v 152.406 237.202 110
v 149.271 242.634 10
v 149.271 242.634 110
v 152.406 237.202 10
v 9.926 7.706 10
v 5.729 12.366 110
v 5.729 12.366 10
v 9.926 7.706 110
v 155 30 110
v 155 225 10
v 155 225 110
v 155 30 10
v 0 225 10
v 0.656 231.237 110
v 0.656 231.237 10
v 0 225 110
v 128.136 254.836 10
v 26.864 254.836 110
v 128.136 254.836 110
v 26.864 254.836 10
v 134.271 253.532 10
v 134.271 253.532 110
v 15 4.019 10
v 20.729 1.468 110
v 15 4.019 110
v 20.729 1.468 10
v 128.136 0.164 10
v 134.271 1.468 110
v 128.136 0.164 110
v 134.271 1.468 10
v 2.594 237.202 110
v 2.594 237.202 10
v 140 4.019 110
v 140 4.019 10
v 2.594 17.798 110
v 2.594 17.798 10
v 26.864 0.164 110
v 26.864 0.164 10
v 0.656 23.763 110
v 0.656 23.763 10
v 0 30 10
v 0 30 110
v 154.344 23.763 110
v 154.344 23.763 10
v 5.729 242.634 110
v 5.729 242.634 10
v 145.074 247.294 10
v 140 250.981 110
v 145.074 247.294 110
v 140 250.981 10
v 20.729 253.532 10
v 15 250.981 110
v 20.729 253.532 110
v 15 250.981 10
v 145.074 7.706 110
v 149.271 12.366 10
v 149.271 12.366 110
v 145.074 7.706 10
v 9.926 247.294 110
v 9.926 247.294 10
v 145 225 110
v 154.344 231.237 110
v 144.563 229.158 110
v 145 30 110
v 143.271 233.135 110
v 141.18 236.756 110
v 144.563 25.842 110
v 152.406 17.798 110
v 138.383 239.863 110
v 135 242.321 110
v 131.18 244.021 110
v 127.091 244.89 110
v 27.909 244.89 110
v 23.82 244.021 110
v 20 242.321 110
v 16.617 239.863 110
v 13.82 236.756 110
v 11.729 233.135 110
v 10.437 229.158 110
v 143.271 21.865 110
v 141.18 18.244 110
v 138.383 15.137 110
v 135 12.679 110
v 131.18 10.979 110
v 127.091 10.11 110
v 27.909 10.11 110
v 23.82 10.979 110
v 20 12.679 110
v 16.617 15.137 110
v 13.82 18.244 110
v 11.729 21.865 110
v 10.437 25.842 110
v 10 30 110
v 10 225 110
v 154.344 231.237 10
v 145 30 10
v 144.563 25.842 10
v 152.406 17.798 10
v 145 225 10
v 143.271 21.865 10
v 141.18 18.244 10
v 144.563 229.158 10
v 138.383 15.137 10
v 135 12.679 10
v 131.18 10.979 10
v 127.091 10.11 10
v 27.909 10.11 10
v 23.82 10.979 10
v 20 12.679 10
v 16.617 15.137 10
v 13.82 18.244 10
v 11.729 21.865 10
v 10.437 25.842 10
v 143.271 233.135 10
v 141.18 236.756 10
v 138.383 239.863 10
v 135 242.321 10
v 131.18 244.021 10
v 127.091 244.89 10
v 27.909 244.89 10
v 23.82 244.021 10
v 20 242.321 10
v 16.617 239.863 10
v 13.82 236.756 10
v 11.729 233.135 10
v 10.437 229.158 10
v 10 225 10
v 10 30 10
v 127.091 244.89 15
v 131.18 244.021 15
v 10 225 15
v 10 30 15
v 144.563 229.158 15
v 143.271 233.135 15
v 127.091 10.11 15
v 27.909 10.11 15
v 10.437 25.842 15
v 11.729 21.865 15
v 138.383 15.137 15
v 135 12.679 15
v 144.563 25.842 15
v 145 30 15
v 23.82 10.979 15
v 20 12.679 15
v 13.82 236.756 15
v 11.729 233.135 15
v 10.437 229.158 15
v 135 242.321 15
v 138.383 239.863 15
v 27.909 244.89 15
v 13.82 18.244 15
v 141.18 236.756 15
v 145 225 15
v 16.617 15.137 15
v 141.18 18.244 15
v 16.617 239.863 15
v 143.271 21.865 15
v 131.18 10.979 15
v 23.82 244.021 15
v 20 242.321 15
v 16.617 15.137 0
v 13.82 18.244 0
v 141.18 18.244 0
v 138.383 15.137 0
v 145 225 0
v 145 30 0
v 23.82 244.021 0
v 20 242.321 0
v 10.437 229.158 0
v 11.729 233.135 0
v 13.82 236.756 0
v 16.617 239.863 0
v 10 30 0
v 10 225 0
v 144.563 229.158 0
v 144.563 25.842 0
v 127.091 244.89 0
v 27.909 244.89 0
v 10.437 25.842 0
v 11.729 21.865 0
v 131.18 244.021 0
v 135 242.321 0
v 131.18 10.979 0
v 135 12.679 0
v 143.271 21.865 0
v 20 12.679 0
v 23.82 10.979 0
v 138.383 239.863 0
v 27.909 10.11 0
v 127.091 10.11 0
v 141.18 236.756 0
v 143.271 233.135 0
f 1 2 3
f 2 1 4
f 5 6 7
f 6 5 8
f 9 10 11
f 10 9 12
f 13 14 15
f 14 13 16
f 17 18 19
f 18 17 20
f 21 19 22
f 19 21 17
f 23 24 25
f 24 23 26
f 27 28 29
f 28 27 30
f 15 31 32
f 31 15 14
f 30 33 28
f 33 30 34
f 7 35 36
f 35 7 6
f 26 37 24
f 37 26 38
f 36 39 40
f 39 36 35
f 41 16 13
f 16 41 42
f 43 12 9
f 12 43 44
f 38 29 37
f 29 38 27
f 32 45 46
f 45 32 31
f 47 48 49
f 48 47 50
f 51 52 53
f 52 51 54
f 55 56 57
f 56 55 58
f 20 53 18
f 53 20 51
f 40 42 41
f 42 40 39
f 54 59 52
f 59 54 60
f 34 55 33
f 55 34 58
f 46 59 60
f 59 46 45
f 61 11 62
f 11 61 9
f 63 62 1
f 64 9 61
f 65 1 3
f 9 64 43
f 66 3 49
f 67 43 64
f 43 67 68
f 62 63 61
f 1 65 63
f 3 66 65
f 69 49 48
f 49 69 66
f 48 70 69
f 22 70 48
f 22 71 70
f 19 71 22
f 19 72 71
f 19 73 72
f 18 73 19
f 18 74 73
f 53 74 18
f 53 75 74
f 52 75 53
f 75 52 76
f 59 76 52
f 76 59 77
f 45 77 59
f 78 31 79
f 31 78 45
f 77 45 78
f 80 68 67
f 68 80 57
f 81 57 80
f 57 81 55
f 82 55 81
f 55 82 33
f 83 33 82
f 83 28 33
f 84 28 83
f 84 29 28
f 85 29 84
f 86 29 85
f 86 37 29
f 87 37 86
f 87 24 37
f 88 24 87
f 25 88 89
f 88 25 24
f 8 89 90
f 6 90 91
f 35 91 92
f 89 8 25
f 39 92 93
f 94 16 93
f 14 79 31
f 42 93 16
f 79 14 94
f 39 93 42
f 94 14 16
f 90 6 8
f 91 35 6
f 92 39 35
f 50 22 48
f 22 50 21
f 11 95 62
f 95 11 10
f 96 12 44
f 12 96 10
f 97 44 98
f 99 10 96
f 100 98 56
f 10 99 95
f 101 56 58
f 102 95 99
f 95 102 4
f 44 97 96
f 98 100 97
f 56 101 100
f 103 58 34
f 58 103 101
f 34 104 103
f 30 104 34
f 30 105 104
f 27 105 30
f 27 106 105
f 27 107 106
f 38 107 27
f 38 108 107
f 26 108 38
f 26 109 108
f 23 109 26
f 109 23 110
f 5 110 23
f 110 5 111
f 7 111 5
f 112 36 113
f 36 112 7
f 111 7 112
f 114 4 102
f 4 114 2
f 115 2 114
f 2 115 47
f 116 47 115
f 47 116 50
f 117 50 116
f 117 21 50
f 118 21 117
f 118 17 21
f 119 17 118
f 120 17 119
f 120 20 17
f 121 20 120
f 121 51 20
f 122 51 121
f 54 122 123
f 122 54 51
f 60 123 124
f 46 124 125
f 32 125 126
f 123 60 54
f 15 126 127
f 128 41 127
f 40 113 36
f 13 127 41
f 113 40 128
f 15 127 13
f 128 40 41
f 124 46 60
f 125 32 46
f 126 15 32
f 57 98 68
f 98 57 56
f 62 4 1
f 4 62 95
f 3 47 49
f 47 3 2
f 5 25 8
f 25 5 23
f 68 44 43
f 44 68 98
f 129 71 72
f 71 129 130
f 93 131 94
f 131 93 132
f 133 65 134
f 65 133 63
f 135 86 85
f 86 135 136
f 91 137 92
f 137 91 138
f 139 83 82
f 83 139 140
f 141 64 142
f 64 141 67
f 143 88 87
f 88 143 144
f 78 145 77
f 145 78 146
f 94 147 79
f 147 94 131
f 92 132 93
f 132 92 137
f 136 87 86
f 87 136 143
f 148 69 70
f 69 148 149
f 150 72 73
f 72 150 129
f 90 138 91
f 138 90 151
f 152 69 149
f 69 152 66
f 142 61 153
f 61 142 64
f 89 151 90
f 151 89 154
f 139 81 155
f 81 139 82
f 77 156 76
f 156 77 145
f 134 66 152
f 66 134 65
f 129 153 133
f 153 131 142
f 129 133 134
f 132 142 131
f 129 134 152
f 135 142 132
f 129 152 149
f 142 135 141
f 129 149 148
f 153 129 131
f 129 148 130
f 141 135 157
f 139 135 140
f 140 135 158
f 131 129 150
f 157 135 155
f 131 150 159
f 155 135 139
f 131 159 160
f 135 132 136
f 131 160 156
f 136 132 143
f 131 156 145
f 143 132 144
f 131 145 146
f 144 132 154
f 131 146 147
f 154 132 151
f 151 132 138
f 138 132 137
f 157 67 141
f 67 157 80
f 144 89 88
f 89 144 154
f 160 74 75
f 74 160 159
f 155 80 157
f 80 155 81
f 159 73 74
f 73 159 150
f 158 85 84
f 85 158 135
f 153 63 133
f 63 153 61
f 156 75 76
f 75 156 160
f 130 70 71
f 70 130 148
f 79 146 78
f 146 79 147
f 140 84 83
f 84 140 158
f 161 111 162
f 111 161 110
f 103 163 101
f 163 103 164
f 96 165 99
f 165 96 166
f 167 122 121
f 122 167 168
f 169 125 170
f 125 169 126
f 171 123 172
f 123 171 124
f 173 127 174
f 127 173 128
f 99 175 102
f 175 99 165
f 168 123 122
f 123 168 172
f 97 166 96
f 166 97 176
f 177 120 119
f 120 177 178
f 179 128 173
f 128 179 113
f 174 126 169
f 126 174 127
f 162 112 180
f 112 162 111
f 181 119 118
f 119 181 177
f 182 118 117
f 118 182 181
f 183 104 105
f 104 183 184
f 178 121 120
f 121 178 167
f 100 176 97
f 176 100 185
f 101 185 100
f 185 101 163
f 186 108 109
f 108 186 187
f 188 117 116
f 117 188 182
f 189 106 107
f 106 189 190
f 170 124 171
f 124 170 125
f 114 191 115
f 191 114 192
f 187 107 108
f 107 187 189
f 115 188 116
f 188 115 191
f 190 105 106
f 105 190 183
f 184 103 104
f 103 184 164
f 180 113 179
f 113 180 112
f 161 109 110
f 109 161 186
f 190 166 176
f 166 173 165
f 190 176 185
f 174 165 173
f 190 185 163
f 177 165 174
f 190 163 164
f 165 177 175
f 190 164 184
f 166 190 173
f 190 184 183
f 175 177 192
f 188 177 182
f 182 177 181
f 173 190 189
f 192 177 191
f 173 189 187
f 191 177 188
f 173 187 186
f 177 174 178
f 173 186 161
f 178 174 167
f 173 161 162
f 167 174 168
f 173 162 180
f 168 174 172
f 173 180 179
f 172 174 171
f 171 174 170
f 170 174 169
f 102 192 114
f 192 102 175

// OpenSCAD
radius=20;
lengthInternal=135;
widthInternal=235;
thickness=10;
outRadius=radius+thickness;
lengthExternal=thickness*2+lengthInternal;
widthExternal=thickness*2+widthInternal;
height=100;

color("red") translate([thickness,thickness,0]) hull() {
	translate([radius,radius,0]) cylinder(r=radius, h=10);
	translate([lengthInternal-radius,radius,0]) cylinder(r=radius, h=10);
	translate([radius,widthInternal-radius,0]) cylinder(r=radius, h=10);
	translate([lengthInternal-radius,widthInternal-radius,0]) cylinder(r=radius, h=10);
}

difference() {
translate([0,0,10]) hull() {
	translate([outRadius,outRadius,0]) cylinder(r=outRadius, h=height);
	translate([lengthInternal+2*thickness-outRadius,outRadius,0]) cylinder(r=outRadius, h=height);
	translate([outRadius,widthInternal+2*thickness-outRadius,0]) cylinder(r=outRadius, h=height);
	translate([lengthInternal+2*thickness-outRadius,widthInternal+2*thickness-outRadius,0]) cylinder(r=outRadius, h=height);
}
translate([thickness,thickness,15]) hull() {
	translate([radius,radius,0]) cylinder(r=radius, h=height);
	translate([lengthInternal-radius,radius,0]) cylinder(r=radius, h=height);
	translate([radius,widthInternal-radius,0]) cylinder(r=radius, h=height);
	translate([lengthInternal-radius,widthInternal-radius,0]) cylinder(r=radius, h=height);
}
}
